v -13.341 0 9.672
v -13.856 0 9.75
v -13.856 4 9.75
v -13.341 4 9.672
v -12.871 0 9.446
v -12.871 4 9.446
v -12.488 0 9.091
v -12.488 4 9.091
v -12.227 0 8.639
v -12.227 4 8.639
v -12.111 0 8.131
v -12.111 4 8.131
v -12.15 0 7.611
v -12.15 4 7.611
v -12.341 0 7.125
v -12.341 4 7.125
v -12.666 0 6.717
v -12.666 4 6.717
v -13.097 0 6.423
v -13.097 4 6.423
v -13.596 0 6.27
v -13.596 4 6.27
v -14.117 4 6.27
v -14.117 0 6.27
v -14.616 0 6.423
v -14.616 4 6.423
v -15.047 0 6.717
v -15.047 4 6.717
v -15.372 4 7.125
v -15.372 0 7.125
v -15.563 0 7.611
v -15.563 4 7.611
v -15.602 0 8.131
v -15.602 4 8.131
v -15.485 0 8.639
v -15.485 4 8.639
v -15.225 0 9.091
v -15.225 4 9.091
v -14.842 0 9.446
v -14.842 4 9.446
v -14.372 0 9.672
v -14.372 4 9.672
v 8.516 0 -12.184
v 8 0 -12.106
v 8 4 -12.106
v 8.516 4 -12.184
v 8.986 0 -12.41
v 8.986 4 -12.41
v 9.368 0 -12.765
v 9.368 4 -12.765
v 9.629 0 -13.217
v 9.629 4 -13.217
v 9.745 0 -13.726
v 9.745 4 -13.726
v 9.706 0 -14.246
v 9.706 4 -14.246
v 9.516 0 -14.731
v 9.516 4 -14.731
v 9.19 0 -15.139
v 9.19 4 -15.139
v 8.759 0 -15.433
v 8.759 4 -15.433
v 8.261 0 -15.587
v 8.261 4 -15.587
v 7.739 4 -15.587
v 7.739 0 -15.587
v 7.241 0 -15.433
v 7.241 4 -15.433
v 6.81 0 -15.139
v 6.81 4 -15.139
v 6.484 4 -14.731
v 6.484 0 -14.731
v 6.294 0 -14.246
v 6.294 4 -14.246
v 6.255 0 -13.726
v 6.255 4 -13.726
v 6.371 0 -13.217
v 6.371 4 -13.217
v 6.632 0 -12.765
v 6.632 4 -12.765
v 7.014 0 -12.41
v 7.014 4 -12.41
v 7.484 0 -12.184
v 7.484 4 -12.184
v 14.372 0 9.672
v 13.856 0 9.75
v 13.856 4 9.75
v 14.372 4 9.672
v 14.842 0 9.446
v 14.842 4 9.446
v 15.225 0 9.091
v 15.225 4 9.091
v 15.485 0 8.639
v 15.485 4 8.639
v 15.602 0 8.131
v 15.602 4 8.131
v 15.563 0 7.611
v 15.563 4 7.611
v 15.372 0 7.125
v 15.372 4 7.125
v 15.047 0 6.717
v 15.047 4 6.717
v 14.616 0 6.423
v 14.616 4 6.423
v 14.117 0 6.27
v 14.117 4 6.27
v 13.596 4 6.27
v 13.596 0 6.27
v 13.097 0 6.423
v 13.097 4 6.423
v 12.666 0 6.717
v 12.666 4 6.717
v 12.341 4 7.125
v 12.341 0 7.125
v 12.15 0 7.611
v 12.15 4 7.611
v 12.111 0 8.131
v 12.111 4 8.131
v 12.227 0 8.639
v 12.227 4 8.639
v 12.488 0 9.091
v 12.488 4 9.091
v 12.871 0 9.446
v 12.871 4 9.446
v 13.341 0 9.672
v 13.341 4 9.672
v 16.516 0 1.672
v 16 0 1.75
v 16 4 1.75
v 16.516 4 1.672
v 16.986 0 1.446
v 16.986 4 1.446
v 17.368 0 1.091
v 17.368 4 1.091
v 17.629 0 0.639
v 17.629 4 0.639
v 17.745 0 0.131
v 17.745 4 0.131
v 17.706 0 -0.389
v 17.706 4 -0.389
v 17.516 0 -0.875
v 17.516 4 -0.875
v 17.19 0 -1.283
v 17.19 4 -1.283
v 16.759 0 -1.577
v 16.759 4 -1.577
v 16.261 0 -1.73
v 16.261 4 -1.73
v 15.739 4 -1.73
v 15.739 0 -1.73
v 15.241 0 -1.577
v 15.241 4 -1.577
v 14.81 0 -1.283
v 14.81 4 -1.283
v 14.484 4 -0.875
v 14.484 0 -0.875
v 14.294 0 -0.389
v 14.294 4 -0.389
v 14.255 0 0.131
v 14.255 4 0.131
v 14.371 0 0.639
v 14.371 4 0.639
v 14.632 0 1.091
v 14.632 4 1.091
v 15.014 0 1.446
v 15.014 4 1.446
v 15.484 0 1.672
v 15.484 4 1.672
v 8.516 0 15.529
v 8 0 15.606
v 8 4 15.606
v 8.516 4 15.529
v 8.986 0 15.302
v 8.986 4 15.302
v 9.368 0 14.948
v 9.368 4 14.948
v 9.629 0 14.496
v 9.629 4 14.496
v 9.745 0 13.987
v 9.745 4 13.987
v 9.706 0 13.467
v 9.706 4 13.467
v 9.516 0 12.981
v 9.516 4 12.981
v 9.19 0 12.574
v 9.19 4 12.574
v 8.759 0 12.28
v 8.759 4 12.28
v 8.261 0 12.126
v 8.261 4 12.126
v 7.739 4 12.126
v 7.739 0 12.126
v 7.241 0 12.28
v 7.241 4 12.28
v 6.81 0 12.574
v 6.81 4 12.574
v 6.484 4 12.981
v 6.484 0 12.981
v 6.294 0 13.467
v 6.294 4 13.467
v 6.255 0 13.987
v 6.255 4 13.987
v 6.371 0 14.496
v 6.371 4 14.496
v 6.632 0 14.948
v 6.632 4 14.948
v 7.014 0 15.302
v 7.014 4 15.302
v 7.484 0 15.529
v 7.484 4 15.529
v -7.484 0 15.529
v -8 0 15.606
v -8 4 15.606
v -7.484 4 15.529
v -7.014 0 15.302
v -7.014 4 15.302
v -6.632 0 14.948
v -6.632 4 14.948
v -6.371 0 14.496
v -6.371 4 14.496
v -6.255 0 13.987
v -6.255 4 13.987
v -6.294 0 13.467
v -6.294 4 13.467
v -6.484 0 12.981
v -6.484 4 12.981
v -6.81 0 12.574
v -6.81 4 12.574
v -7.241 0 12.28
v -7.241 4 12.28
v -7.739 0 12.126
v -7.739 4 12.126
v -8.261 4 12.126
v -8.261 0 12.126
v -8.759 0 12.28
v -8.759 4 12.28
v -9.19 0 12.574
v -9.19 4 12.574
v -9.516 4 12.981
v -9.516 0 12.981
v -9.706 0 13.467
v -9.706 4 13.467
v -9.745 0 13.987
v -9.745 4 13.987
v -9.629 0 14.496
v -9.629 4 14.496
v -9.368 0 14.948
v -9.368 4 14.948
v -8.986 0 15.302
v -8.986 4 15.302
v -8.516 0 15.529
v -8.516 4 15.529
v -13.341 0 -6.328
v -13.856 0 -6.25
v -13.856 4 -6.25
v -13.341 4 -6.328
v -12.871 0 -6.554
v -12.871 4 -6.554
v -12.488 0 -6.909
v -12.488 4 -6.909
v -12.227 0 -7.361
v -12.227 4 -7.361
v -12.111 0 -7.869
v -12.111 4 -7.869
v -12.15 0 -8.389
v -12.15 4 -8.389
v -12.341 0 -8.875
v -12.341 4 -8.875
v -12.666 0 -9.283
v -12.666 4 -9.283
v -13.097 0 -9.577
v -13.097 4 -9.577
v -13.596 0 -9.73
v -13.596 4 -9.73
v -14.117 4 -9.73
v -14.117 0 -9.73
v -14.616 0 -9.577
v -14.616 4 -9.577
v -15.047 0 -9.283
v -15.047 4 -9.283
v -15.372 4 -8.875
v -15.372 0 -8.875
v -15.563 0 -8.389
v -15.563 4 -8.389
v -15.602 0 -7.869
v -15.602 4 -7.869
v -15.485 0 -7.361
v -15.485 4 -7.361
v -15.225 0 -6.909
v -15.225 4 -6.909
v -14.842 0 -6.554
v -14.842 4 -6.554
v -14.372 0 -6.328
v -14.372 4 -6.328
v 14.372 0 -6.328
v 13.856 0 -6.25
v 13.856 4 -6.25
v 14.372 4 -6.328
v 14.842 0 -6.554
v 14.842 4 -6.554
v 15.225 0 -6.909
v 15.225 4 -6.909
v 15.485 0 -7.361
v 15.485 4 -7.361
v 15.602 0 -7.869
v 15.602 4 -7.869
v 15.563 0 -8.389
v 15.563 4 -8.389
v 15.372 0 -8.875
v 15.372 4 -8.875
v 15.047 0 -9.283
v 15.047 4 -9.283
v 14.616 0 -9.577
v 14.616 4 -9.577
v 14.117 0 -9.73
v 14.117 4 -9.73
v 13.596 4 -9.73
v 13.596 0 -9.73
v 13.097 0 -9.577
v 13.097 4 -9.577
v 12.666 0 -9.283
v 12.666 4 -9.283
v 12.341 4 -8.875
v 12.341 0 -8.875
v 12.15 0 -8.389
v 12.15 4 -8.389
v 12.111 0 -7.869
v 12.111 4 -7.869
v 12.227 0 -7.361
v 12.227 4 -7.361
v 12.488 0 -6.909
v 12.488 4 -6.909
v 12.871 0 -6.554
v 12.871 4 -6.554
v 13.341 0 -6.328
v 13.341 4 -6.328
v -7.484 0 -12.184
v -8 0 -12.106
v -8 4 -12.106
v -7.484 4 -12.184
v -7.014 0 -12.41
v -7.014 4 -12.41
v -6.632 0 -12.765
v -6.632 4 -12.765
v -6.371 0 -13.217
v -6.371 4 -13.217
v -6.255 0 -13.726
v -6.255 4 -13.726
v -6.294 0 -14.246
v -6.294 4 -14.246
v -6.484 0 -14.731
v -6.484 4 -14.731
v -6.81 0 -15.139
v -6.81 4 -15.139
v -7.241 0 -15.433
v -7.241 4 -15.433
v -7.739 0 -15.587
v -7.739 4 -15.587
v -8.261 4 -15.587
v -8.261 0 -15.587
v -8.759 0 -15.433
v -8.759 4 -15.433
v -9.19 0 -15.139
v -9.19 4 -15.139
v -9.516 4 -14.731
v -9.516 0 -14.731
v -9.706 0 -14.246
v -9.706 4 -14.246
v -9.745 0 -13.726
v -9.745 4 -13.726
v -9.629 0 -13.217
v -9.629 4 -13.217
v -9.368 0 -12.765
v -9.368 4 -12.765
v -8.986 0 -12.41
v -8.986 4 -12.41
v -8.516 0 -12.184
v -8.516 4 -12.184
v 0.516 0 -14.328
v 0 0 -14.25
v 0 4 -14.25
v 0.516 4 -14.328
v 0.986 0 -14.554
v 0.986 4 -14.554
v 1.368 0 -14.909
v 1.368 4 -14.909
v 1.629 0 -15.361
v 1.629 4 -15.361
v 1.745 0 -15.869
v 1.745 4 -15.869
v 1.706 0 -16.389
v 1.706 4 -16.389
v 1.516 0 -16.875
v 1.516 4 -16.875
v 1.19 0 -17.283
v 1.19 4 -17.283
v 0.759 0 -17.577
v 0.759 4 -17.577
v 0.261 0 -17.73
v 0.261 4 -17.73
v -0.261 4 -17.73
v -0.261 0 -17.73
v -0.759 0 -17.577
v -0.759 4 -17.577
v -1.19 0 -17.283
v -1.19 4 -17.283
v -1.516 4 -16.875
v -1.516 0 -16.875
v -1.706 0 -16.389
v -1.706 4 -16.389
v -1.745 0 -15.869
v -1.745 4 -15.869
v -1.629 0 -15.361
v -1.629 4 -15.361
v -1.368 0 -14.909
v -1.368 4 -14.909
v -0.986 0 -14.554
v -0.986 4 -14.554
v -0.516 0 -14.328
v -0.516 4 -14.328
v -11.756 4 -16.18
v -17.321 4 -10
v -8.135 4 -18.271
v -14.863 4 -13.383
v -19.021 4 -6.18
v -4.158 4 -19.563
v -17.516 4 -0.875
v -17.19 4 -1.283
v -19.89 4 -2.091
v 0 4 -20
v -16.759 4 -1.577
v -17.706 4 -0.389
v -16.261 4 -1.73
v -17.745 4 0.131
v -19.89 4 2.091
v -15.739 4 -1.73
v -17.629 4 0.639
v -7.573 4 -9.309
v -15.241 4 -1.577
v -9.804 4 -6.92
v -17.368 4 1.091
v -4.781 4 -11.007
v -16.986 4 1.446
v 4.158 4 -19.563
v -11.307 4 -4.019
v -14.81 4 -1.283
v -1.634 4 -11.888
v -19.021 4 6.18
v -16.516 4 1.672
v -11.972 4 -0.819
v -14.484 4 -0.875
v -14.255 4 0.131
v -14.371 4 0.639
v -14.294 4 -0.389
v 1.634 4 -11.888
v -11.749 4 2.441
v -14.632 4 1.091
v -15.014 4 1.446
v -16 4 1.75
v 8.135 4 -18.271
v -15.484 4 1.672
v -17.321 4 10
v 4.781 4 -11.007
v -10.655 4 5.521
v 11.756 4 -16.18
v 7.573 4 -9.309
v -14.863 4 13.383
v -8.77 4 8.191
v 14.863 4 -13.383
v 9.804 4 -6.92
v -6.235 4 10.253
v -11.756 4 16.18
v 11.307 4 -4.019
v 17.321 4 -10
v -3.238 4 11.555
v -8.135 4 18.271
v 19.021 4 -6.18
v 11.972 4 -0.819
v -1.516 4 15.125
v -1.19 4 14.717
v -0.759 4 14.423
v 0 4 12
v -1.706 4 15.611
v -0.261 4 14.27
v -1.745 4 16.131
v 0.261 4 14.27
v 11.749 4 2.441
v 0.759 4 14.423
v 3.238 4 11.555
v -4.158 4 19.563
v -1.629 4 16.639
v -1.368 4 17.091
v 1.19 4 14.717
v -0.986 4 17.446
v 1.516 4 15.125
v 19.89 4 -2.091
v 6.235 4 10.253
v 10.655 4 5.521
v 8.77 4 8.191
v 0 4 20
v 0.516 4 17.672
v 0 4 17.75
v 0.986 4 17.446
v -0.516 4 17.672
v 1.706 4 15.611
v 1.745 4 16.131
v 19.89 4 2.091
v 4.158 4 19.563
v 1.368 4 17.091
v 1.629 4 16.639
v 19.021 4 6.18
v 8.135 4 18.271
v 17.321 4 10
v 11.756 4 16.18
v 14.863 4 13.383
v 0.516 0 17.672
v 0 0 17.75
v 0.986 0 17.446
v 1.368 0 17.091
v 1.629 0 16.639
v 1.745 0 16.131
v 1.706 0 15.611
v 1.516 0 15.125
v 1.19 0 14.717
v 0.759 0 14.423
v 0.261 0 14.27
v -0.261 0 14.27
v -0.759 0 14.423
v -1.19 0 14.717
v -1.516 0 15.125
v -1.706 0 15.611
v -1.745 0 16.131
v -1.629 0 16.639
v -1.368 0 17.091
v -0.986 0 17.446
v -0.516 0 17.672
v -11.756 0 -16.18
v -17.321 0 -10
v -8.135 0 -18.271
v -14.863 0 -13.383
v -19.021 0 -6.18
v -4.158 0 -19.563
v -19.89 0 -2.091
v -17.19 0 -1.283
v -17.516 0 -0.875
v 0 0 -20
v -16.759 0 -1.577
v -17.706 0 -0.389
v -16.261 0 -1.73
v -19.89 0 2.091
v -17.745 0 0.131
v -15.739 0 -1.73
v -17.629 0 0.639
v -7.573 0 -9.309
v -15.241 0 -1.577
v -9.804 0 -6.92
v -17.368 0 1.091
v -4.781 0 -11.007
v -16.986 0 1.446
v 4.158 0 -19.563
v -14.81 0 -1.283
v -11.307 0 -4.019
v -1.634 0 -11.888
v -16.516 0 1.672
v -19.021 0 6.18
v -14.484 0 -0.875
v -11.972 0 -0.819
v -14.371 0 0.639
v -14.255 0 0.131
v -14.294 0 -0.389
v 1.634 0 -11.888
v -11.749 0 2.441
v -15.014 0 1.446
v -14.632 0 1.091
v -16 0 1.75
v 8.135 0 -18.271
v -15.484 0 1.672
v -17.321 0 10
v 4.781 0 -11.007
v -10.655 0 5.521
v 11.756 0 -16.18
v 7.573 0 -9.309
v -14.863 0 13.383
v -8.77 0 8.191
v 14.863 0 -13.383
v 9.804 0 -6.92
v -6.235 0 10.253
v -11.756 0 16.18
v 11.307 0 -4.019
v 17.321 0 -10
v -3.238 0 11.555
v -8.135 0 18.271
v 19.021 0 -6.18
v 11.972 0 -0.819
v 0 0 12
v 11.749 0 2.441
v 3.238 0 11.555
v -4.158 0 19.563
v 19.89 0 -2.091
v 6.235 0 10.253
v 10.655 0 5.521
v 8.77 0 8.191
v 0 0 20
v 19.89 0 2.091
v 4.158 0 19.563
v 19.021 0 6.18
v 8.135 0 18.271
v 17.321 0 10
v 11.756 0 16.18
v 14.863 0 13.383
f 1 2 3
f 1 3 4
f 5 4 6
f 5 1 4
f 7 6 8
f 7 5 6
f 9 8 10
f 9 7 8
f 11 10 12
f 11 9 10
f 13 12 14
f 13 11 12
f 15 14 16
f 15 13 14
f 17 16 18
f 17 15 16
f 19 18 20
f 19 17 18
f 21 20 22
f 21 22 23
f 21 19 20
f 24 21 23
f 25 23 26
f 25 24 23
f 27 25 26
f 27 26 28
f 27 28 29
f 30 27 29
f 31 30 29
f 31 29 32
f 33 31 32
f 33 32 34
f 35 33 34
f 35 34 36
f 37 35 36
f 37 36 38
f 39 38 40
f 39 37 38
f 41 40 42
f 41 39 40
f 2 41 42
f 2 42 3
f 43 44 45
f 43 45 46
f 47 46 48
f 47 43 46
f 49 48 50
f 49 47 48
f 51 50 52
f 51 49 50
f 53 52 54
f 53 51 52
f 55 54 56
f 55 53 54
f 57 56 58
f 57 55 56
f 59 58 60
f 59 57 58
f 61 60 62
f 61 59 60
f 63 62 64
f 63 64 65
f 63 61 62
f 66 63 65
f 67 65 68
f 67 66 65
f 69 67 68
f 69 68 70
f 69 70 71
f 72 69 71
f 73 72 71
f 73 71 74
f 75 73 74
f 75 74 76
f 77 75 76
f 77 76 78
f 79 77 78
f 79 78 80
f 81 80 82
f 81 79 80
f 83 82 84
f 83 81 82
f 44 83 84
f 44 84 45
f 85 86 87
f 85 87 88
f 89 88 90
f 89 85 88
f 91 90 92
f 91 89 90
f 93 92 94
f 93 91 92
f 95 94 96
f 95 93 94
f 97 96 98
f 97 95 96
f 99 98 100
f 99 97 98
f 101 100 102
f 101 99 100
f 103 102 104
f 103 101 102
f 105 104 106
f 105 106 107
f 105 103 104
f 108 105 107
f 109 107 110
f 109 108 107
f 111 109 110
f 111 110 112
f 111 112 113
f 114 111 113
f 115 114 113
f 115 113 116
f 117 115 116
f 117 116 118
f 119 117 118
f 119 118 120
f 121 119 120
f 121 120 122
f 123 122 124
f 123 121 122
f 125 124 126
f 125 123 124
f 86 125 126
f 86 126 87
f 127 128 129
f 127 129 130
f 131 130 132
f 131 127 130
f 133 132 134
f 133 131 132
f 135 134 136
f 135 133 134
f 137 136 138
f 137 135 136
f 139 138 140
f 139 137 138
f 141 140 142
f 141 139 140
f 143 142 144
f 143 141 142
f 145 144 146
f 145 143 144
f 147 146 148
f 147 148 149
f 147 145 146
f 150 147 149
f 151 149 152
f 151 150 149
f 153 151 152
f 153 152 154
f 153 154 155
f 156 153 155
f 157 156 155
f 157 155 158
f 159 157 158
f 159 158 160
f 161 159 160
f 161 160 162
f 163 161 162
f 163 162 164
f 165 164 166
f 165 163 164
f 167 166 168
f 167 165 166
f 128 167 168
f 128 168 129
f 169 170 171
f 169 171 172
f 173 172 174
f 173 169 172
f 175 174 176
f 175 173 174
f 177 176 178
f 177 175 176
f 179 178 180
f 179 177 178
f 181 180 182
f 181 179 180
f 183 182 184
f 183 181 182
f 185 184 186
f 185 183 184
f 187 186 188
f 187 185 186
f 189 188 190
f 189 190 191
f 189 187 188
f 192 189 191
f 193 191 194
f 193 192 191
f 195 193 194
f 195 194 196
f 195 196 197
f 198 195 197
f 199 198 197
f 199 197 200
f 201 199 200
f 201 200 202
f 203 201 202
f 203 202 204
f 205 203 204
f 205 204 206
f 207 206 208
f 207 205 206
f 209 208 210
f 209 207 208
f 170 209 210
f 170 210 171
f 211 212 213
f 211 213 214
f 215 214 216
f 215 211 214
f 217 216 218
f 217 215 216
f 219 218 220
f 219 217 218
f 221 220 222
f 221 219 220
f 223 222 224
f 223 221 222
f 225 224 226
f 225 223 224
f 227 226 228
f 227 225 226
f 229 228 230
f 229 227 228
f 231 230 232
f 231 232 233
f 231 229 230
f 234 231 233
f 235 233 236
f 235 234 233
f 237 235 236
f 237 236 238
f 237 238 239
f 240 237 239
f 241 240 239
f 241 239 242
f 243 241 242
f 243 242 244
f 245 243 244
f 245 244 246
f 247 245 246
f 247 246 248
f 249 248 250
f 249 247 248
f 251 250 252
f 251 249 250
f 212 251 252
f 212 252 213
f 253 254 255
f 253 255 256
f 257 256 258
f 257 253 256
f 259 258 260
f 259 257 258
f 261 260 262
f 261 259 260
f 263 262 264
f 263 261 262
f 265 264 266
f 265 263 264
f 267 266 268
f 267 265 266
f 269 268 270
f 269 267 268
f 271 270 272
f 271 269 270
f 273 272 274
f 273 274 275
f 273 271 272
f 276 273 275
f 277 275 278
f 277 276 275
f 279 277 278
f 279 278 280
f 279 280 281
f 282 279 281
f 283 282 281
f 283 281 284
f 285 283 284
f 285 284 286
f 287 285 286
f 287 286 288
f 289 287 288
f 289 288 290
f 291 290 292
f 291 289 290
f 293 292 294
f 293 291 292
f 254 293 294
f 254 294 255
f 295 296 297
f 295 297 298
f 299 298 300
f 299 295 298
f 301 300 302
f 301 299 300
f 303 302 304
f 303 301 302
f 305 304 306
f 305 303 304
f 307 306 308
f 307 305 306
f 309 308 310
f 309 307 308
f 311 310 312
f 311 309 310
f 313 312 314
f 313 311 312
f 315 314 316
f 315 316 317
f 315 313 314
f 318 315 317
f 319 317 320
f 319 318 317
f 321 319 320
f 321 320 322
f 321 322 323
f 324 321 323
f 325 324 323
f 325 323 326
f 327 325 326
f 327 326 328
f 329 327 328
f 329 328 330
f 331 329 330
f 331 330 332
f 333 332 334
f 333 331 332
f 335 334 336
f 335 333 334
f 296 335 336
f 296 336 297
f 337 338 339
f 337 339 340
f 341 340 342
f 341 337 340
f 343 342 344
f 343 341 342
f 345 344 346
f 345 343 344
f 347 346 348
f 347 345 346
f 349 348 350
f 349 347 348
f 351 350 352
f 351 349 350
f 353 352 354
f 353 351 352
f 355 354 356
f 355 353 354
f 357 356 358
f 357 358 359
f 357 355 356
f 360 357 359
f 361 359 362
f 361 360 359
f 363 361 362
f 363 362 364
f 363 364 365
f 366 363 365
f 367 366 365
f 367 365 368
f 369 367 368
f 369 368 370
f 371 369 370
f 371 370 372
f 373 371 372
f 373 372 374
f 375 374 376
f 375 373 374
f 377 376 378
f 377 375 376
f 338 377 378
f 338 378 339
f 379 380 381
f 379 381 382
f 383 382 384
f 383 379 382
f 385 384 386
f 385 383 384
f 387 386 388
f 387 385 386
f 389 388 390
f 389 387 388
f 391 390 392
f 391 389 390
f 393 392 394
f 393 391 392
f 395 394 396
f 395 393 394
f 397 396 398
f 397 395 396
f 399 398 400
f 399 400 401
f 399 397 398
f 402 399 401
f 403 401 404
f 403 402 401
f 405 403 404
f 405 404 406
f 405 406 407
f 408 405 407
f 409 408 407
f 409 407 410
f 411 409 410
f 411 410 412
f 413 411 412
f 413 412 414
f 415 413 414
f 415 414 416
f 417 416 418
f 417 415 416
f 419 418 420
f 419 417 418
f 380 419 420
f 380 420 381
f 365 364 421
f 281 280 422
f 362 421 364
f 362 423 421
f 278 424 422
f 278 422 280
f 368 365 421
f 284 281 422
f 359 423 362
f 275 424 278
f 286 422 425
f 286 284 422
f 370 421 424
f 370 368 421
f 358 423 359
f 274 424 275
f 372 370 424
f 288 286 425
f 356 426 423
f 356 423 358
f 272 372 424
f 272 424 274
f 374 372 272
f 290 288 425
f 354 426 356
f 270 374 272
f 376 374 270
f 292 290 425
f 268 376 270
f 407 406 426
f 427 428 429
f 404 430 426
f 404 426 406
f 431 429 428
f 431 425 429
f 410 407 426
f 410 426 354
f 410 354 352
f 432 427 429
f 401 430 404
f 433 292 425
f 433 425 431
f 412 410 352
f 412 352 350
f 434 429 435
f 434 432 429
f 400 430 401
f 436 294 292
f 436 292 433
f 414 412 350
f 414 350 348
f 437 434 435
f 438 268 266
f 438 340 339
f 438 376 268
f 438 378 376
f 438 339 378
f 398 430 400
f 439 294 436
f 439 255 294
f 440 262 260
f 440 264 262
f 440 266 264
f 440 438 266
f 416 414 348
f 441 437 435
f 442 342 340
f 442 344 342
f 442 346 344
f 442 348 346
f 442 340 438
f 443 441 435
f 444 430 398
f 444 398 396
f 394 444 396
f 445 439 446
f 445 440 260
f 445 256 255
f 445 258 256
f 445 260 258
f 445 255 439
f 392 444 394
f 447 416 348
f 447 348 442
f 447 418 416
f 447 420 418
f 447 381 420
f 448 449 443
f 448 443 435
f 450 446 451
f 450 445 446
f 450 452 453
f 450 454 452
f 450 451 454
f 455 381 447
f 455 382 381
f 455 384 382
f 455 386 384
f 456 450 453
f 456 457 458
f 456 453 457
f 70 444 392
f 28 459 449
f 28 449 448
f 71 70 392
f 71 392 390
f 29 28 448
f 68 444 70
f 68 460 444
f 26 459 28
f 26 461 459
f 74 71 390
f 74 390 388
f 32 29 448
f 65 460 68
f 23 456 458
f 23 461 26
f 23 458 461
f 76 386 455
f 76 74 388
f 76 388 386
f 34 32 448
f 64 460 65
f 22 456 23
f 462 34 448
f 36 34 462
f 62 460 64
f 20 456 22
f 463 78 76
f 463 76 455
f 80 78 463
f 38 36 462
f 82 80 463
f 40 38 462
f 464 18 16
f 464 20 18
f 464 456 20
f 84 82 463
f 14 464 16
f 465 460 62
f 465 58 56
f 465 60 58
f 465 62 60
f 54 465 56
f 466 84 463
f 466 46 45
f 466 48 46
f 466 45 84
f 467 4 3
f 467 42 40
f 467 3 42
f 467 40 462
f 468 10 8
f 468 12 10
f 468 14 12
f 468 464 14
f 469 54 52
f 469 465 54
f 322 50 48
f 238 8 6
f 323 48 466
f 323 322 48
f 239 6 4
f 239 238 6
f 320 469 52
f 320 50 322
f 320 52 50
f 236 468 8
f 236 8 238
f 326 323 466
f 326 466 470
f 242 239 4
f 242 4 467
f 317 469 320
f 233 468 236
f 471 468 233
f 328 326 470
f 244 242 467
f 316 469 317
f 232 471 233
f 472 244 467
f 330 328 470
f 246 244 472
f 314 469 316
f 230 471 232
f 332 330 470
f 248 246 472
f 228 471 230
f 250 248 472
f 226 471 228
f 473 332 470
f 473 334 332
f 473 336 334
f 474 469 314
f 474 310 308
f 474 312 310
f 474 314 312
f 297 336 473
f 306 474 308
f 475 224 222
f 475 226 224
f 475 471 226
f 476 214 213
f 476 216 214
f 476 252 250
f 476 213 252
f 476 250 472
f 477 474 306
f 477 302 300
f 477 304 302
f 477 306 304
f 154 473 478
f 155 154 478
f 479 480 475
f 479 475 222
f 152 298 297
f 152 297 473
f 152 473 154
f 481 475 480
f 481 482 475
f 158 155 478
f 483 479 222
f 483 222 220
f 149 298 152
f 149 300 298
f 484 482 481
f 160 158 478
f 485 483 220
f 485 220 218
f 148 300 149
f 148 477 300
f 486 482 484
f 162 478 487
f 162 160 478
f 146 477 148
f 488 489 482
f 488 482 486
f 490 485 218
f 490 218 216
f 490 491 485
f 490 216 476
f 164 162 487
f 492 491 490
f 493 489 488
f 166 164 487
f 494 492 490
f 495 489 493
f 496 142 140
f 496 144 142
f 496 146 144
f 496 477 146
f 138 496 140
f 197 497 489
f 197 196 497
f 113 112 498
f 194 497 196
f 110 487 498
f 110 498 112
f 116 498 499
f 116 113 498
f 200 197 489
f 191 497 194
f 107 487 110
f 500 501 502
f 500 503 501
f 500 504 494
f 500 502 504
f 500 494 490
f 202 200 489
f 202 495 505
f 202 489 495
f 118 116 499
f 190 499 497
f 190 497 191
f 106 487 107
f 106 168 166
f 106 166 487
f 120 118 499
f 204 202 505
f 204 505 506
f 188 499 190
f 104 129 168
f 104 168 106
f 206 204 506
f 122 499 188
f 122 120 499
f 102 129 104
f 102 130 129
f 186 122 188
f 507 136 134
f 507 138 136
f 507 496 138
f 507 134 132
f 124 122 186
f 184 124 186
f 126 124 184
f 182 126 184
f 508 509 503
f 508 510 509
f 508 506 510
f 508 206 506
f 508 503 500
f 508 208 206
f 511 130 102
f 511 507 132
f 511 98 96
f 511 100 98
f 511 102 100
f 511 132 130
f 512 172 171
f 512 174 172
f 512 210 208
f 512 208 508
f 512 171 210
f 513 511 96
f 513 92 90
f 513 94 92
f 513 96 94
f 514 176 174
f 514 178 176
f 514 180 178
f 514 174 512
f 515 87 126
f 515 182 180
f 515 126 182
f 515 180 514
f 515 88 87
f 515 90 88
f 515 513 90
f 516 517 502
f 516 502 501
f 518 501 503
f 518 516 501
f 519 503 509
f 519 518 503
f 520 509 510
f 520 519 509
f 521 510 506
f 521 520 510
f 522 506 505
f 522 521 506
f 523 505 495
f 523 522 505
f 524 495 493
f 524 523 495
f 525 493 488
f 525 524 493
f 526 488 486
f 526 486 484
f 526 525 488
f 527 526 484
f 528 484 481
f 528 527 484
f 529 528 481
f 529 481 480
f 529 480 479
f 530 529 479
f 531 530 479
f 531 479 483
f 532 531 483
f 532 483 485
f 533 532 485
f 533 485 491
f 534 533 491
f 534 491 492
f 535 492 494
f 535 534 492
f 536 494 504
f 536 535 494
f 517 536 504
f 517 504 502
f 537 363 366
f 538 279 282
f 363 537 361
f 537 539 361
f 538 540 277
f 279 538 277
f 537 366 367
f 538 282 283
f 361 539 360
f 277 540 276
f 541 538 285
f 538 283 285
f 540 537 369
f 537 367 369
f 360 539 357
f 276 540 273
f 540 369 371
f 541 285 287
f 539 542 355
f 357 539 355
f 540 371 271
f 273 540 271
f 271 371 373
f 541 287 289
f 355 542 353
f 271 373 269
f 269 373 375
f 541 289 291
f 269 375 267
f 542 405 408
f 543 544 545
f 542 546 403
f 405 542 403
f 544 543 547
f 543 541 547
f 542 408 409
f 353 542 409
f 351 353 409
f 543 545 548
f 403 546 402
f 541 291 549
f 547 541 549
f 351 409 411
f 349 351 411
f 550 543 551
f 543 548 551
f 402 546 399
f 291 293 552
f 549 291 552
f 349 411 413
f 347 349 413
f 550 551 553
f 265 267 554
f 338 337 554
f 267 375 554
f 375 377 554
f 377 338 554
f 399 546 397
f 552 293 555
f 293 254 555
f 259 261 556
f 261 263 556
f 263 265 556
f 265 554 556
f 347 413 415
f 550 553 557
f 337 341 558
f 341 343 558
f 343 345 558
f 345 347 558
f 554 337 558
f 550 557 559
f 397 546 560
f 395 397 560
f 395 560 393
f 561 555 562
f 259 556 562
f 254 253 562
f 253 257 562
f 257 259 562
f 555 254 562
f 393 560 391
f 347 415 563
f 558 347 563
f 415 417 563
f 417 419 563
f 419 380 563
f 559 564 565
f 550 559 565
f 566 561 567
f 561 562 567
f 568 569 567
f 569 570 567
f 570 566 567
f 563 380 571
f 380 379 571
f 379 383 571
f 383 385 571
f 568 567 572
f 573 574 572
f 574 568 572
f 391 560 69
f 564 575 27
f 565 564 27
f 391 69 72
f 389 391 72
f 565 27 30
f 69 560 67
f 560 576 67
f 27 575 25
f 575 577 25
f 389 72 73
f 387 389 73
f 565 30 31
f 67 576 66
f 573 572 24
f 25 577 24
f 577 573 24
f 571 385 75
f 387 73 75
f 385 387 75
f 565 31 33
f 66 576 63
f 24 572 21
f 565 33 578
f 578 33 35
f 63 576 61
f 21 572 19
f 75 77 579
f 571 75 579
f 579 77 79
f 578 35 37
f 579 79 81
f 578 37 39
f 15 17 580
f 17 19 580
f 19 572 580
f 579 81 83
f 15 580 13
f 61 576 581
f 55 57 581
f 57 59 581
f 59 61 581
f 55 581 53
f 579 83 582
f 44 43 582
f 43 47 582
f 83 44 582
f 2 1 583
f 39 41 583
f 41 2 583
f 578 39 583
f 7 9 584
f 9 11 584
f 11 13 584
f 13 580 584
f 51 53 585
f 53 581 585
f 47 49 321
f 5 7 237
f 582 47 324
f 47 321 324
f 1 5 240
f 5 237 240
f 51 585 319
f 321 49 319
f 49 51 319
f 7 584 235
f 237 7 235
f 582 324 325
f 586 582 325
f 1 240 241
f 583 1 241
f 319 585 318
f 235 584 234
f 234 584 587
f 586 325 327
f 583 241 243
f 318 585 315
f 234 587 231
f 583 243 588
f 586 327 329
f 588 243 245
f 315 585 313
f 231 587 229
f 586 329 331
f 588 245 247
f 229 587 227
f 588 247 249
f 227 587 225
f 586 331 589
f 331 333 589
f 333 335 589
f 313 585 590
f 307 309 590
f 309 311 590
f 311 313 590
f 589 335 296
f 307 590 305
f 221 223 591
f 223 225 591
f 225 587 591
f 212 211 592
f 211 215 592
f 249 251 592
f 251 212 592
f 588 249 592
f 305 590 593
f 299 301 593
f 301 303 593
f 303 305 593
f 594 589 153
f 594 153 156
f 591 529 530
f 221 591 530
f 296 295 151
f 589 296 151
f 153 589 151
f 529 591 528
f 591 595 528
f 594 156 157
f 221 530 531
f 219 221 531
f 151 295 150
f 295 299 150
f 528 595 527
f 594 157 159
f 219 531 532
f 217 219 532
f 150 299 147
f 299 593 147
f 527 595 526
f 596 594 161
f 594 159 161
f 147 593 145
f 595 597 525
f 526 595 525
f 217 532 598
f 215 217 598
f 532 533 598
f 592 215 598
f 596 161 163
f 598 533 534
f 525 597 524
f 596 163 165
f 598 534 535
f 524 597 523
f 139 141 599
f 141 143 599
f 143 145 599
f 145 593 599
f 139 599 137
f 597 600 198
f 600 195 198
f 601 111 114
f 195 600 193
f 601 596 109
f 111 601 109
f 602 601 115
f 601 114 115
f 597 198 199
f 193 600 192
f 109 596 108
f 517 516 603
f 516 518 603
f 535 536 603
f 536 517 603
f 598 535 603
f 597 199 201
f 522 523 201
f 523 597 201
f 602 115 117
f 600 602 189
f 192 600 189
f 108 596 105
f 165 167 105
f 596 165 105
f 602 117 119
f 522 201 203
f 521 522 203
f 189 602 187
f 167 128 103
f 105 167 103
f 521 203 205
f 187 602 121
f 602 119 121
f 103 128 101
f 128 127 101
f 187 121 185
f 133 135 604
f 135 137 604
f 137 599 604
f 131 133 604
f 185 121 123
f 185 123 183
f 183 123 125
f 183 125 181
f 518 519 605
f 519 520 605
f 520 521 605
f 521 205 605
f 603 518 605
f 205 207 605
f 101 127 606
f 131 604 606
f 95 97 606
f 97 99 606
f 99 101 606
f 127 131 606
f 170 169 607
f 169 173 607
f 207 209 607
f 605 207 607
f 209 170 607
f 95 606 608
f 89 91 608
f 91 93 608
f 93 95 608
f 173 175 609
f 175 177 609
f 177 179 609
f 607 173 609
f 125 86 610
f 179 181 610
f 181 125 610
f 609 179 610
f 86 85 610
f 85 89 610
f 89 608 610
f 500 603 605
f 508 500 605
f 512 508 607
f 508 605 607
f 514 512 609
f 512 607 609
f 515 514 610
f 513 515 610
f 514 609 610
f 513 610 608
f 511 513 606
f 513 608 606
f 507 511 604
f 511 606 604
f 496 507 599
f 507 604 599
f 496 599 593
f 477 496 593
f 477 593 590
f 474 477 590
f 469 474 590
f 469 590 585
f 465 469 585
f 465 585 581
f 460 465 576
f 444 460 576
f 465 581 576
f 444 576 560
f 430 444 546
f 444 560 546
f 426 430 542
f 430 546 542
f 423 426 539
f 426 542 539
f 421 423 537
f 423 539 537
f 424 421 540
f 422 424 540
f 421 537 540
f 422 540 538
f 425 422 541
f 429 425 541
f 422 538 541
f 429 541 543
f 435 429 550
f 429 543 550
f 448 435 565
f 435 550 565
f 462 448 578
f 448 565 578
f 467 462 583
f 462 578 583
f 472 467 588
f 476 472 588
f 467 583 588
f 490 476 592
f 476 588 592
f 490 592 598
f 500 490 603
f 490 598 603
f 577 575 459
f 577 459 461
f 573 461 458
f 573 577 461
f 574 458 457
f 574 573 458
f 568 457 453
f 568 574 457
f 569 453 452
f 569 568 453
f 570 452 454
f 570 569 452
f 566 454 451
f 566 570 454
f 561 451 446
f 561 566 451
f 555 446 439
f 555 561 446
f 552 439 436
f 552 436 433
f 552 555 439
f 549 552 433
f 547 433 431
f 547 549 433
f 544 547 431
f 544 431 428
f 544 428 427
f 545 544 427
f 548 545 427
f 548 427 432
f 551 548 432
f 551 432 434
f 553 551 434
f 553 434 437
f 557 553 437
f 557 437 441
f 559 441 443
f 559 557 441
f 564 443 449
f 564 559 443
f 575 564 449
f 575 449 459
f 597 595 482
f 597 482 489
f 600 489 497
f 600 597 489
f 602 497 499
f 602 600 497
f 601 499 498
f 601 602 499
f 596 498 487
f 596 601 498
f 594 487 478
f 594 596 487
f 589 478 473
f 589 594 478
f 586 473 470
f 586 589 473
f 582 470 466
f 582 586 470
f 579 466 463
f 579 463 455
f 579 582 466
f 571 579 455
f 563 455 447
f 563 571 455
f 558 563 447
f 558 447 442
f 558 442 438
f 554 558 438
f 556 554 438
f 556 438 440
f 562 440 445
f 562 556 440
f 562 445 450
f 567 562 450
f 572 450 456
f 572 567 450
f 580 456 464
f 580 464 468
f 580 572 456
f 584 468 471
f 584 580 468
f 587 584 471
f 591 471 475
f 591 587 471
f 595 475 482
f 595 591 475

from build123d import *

# Parameters (mm, degrees)
ESBO_O1_R                = 20
ESBO_O1_R_2              = 1.75
ESBO_O1_R_3              = 12
RESSALTO_EXTRUS_O1_DEPTH = 4


with BuildPart() as part:
    # Esboço1 → Ressalto-extrusão1 (new body)
    with BuildSketch(Plane(origin=(0, 0, 0), x_dir=(1, 0, 0), z_dir=(0, 1, 0))):
        with Locations(Location((0, 0, 0), (0, 0, 270))):
            Circle(ESBO_O1_R)
        with Locations(Location((0, 16, 0), (0, 0, 270))):
            Circle(ESBO_O1_R_2, mode=Mode.SUBTRACT)
        with Locations(Location((8, 13.856406461, 0), (0, 0, 270))):
            Circle(ESBO_O1_R_2, mode=Mode.SUBTRACT)
        with Locations(Location((13.856406461, 8, 0), (0, 0, 270))):
            Circle(ESBO_O1_R_2, mode=Mode.SUBTRACT)
        with Locations(Location((16, 0, 0), (0, 0, 270))):
            Circle(ESBO_O1_R_2, mode=Mode.SUBTRACT)
        with Locations(Location((13.856406461, -8, 0), (0, 0, 270))):
            Circle(ESBO_O1_R_2, mode=Mode.SUBTRACT)
        with Locations(Location((0, -16, 0), (0, 0, 270))):
            Circle(ESBO_O1_R_2, mode=Mode.SUBTRACT)
        with Locations(Location((8, -13.856406461, 0), (0, 0, 270))):
            Circle(ESBO_O1_R_2, mode=Mode.SUBTRACT)
        with Locations(Location((-8, -13.856406461, 0), (0, 0, 270))):
            Circle(ESBO_O1_R_2, mode=Mode.SUBTRACT)
        with Locations(Location((-13.856406461, -8, 0), (0, 0, 270))):
            Circle(ESBO_O1_R_2, mode=Mode.SUBTRACT)
        with Locations(Location((-16, 0, 0), (0, 0, 270))):
            Circle(ESBO_O1_R_2, mode=Mode.SUBTRACT)
        with Locations(Location((-13.856406461, 8, 0), (0, 0, 270))):
            Circle(ESBO_O1_R_2, mode=Mode.SUBTRACT)
        with Locations(Location((-8, 13.856406461, 0), (0, 0, 270))):
            Circle(ESBO_O1_R_2, mode=Mode.SUBTRACT)
        with Locations(Location((0, 0, 0), (0, 0, 270))):
            Circle(ESBO_O1_R_3, mode=Mode.SUBTRACT)
    extrude(amount=RESSALTO_EXTRUS_O1_DEPTH)


solid = part.part
